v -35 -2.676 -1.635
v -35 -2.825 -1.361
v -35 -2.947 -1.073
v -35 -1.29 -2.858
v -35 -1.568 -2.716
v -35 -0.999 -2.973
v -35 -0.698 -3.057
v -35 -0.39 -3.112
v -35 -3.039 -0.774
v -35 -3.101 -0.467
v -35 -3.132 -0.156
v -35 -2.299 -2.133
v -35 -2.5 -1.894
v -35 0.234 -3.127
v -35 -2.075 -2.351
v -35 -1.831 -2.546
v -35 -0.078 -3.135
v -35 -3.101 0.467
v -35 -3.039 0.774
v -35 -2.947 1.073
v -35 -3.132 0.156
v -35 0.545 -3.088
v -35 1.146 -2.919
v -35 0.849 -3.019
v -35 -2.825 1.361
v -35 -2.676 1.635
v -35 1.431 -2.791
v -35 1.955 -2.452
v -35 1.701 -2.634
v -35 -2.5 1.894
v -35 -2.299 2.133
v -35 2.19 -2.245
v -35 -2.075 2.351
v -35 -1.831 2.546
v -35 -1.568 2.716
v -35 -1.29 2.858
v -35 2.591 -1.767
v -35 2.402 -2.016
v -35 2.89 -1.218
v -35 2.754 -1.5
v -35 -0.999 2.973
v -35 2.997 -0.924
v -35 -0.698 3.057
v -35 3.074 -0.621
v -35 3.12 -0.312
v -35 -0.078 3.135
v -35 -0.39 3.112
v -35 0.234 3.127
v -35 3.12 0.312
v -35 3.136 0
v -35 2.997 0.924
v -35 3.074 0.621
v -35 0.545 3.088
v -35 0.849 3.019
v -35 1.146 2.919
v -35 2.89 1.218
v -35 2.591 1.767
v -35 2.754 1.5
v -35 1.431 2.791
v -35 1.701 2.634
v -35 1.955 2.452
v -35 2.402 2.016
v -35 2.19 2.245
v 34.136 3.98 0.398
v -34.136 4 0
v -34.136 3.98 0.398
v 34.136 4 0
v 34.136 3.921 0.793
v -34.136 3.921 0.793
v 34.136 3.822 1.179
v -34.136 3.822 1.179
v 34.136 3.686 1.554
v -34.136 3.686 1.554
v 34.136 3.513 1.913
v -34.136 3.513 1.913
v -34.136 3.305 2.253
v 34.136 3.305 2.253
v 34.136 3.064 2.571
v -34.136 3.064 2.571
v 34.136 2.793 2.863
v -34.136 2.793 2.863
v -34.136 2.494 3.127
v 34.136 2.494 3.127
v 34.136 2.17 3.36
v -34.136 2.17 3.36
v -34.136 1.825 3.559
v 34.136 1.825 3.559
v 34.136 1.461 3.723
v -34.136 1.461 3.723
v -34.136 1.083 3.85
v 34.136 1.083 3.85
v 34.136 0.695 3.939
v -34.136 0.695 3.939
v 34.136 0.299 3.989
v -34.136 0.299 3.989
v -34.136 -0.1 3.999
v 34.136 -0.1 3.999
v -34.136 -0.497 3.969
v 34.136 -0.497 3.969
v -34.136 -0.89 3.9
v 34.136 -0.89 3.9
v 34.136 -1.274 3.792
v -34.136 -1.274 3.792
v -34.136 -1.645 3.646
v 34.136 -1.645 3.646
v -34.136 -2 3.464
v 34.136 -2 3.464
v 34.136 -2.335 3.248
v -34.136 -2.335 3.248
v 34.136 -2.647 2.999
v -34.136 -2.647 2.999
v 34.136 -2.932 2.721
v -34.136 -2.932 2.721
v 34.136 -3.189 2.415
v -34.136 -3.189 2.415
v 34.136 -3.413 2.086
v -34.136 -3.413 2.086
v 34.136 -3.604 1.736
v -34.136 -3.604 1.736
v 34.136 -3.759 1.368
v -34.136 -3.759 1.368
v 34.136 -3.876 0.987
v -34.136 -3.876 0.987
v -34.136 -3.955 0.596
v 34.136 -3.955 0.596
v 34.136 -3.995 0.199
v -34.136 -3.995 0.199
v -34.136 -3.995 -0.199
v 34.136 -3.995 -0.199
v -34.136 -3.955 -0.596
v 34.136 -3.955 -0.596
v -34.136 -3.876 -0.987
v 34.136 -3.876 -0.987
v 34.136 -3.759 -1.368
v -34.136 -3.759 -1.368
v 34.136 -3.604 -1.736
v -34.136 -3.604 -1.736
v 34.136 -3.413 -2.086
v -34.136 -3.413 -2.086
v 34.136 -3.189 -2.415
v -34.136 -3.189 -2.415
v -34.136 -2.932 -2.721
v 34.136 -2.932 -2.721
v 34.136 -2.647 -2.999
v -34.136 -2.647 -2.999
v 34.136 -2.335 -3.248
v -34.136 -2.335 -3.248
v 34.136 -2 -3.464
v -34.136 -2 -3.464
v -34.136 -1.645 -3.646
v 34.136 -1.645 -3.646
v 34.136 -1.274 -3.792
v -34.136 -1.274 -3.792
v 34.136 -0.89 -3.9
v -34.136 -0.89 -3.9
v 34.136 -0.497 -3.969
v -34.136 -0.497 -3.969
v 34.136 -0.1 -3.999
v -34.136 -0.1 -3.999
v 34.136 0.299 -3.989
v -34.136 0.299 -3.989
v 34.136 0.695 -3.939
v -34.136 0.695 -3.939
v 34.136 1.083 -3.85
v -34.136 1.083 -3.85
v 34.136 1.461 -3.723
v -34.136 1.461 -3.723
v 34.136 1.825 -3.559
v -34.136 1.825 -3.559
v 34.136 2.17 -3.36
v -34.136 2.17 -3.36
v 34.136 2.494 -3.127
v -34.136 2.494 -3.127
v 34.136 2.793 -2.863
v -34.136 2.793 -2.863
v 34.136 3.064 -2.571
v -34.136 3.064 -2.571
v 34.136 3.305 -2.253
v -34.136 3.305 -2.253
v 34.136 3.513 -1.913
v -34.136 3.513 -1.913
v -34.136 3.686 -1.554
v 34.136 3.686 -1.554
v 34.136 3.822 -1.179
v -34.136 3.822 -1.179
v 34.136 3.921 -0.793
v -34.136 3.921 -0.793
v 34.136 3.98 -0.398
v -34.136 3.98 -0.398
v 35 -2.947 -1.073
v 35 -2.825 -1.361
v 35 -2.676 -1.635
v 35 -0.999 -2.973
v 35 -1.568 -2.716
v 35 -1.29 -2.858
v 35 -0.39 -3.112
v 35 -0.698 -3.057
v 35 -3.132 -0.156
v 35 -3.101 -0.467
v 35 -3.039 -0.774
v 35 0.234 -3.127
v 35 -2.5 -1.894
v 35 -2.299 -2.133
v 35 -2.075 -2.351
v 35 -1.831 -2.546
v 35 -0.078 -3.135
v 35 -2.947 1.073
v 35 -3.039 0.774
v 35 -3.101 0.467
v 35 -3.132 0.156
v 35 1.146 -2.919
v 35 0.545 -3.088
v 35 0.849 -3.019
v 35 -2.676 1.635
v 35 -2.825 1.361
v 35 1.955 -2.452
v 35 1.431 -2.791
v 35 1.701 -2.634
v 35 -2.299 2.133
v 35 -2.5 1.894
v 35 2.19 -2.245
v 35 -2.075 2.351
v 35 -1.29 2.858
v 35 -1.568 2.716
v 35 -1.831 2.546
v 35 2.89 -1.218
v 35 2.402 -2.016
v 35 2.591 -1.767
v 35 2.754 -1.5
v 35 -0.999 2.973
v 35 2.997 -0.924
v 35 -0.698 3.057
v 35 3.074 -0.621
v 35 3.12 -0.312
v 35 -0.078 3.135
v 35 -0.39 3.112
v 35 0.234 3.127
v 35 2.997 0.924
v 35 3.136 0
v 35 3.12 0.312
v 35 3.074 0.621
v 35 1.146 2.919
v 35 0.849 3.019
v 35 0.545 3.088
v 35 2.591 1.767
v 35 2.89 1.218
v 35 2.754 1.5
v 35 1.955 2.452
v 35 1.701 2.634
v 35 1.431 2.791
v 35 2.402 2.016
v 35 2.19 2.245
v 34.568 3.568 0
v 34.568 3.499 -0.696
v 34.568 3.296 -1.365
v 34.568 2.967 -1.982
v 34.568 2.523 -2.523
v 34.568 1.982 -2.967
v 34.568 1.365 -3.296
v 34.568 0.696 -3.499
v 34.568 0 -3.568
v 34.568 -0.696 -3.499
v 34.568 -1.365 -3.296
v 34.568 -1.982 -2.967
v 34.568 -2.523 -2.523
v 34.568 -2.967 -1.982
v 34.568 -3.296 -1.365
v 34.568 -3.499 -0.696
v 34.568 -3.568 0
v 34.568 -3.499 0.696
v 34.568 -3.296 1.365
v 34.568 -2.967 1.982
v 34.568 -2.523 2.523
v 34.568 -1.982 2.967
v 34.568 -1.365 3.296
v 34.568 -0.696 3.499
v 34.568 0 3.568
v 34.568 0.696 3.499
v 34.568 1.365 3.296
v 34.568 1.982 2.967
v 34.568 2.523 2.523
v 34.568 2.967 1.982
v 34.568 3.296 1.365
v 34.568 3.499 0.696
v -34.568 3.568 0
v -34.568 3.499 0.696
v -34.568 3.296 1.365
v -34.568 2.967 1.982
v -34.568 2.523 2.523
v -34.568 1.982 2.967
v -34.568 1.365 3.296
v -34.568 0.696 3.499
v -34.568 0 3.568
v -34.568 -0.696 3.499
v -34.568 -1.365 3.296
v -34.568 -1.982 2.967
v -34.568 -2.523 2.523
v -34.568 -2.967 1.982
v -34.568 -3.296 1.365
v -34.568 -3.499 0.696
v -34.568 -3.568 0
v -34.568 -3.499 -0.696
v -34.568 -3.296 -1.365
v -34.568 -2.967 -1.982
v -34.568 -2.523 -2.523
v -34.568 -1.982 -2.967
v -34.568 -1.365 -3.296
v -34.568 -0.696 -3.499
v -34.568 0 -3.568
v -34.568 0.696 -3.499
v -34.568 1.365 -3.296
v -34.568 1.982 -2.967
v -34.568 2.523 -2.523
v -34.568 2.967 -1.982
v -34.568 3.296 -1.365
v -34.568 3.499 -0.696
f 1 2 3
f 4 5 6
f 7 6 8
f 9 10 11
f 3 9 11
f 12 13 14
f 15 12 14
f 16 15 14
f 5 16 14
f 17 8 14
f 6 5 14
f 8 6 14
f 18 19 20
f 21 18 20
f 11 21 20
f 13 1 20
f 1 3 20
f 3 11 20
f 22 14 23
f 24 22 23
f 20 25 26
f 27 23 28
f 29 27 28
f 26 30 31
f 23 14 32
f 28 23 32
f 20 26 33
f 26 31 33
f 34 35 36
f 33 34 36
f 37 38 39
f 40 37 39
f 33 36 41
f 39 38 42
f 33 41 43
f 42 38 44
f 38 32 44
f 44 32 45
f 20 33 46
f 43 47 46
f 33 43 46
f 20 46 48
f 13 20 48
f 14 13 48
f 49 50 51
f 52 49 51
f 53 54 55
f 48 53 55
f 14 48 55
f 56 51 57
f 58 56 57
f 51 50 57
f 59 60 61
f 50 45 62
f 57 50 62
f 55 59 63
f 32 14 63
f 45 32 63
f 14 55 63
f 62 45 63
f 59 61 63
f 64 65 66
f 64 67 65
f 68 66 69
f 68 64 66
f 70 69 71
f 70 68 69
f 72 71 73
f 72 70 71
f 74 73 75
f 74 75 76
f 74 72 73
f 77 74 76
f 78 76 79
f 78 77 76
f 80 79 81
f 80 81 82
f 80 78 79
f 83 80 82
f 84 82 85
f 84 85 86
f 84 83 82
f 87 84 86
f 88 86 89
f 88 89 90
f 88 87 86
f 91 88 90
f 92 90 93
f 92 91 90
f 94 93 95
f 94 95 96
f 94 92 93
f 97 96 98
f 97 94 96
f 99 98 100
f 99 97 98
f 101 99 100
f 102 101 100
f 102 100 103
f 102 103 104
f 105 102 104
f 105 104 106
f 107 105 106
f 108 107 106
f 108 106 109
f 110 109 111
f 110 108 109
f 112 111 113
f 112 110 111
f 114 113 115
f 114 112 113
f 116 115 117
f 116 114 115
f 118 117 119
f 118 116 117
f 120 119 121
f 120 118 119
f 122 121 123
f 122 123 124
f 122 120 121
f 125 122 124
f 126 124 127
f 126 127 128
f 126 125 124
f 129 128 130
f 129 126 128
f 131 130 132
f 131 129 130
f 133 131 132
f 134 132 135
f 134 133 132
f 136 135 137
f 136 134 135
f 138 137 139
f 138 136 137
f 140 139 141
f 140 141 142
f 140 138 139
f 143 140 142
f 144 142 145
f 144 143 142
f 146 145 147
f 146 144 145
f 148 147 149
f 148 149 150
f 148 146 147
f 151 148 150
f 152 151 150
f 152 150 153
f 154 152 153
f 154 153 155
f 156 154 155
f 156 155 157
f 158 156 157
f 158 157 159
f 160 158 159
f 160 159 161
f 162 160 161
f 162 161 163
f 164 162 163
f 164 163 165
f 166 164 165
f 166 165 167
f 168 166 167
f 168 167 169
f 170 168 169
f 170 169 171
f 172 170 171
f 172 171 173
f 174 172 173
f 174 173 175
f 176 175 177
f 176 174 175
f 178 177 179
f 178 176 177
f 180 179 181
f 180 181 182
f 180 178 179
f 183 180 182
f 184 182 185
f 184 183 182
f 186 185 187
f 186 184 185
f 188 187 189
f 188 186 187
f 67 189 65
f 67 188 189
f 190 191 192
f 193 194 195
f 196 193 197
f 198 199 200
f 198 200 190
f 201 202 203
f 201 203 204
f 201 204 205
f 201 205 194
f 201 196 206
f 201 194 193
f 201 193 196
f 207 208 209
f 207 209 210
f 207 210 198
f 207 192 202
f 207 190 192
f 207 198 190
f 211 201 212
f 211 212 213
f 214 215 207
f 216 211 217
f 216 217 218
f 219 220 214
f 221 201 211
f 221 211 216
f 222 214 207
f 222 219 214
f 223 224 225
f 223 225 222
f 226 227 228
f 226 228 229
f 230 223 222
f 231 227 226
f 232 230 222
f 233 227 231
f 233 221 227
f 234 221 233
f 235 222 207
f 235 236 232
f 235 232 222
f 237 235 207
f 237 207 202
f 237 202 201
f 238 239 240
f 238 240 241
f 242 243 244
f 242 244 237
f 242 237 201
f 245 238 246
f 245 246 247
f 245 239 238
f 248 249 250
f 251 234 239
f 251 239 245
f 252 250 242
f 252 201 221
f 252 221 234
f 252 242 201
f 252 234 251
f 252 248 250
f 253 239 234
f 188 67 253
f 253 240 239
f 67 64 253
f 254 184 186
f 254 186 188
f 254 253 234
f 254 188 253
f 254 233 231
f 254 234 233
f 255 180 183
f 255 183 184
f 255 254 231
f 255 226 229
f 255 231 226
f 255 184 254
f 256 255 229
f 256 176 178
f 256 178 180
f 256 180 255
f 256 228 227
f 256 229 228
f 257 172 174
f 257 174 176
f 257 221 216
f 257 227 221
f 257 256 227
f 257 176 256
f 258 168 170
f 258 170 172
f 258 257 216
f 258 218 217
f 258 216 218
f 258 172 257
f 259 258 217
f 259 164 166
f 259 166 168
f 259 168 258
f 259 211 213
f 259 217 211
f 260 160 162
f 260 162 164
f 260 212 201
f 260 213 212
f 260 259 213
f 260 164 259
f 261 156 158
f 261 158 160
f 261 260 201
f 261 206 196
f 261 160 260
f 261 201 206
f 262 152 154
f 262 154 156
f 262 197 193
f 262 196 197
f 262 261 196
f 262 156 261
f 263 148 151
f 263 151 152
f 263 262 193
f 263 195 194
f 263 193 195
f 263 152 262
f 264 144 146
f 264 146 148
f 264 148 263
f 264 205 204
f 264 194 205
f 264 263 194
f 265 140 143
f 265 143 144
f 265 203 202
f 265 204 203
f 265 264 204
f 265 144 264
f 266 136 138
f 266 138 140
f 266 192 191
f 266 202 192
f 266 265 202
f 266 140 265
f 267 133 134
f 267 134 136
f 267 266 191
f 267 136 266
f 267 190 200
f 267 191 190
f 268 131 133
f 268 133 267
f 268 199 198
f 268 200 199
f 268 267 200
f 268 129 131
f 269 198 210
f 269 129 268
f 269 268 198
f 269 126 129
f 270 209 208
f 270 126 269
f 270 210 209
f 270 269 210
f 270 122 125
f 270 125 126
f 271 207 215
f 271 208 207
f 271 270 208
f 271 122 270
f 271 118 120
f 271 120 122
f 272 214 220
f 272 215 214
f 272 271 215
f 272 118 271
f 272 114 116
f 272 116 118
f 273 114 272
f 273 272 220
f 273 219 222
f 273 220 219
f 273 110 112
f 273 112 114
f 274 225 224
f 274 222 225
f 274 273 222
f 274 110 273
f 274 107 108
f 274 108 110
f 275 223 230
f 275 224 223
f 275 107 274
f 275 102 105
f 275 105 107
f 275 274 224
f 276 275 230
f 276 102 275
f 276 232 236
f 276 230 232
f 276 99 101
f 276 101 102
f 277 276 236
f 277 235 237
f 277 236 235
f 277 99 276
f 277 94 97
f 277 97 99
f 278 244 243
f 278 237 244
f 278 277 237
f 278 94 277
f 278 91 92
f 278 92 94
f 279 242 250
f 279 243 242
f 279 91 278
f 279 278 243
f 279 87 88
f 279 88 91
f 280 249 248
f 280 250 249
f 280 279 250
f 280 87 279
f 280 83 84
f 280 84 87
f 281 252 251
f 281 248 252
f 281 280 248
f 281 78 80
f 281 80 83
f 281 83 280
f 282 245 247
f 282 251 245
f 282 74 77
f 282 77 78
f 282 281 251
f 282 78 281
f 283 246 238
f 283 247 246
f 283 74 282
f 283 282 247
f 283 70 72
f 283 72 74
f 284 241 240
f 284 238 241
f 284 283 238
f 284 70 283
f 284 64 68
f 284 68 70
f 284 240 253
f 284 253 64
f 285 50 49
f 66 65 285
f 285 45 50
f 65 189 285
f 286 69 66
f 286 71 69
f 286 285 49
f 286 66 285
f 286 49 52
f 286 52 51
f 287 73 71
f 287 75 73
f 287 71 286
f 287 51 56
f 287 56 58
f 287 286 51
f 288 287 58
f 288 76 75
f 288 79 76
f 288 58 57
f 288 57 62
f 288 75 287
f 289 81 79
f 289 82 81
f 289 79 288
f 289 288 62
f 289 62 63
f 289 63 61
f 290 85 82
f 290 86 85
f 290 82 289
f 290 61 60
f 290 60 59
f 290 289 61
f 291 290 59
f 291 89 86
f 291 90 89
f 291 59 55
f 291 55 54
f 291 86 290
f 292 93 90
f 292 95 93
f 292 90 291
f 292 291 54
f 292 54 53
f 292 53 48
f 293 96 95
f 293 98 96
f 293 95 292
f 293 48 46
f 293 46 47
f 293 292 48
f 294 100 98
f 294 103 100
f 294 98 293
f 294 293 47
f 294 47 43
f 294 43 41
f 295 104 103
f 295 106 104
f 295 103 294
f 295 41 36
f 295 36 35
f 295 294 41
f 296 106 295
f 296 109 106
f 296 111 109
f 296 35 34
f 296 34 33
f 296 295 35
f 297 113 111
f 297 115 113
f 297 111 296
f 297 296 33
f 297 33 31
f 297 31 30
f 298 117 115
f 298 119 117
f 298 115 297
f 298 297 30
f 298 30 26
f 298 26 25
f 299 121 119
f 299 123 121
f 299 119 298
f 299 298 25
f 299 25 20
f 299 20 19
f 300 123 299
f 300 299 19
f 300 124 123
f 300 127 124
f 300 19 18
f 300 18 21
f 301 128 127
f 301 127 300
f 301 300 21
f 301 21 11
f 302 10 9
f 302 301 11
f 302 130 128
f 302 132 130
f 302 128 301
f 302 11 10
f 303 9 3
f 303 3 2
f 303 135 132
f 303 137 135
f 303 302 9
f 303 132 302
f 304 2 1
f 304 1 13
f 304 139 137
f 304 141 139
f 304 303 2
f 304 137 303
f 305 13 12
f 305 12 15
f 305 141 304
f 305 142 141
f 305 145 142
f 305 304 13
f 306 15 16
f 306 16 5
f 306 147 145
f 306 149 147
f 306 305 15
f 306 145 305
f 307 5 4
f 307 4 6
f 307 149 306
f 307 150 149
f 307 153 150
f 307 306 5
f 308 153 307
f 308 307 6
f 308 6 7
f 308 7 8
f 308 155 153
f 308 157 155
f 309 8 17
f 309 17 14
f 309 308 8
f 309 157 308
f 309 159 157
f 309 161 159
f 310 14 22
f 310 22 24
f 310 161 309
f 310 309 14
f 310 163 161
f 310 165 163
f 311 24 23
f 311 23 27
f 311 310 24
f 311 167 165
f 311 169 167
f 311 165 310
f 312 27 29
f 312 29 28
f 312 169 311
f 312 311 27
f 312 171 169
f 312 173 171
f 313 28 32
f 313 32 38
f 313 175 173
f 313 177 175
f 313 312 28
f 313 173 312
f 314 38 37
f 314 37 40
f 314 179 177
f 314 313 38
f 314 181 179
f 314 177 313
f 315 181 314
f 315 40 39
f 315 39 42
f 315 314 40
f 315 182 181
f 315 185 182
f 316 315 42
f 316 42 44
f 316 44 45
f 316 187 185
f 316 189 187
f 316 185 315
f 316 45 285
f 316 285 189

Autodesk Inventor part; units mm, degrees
ref_plane "YZ Plane" through (0, 0, 0) normal (1, 0, 0) x (0, 1, 0)
ref_plane "XZ Plane" through (0, 0, 0) normal (0, 1, 0) x (-1, 0, 0)
sketch "Schizzo1" plane through (0, 0, 0) normal (0, 0, 1) x (1, 0, 0)
  line L0 (35, 4) -> (35, 0)
  line L1 (-35, 0) -> (35, 0)
  line L2 (-49, 0) -> (49, 0) projected
  line L3 (0, 4.8) -> (0, -0.8) projected
  line L4 (-35, 4) -> (-35, 0)
  line L5 (0, 4) -> (0, 0) construction
  line L6 (-49, 0) -> (49, 0) projected
  line L7 (-35, 4) -> (35, 4)
  dimension "d13" = 8
  dimension "d87" = 70
  dimension "d88" = 35
revolve "Corpo" add sketch "Schizzo1" angle 360 about axis through (-35, 0, 0) along (1, 0, 0)
thread "Filettatura1" size "M8x1.25" class "6g" standard "ISO Metric profile" length 70
chamfer "Smusso1" distance 0.864 angle 45 1 edges at (35, -4, 0) measured on face at (11.6667, 3.987, -0.3219)
chamfer "Smusso2" distance 0.864 angle 45 1 edges at (-35, -4, 0) measured on face at (11.0907, 3.987, -0.3219)
ref_plane "Work Plane1" through (2.75, 0, 0) normal (0, -1, 0) x (1, 0, 0)
equation "\"d13\" = NND"
equation "\"d87\" = NLG"
equation "\"d88\" = 0.5 * NLG"
equation "\"d1\" = GEL"
equation "\"d9\" = -0.5 * SPD + 0.5 * NND"
equation "\"d10\" = -0.5 * SPD + 0.5 * NND"
equation "\"d11\" = -0.5 * SPD + 0.5 * NND"
equation "\"d12\" = -0.5 * SPD + 0.5 * NND"
equation "\"NLG\" = 70"
equation "\"GEL\" = NLG"
equation "\"GAL\" = 0.61345 * PTC"
equation "\"SPD\" = 6.272"
equation "\"d0\" = NND"
equation "\"GUL\" = 0.61345 * PTC"
equation "\"NND\" = 8"
equation "\"GUL1\" = GUL"
equation "\"GAL1\" = GAL"
equation "\"d80\" = -GUL - GEL"
equation "\"d86\" = -GEL + GUL1"
equation "\"PTC\" = 1.25"
equation "\"THREADDIA\" = 8"
equation "\"TOA\" = 30deg"
equation "\"GD1\" = THREADDIA - 1.2269 * PTC"
properties part number "DIN 976-1 - M8 x 70 - B" material "Acciaio, Dolce"
